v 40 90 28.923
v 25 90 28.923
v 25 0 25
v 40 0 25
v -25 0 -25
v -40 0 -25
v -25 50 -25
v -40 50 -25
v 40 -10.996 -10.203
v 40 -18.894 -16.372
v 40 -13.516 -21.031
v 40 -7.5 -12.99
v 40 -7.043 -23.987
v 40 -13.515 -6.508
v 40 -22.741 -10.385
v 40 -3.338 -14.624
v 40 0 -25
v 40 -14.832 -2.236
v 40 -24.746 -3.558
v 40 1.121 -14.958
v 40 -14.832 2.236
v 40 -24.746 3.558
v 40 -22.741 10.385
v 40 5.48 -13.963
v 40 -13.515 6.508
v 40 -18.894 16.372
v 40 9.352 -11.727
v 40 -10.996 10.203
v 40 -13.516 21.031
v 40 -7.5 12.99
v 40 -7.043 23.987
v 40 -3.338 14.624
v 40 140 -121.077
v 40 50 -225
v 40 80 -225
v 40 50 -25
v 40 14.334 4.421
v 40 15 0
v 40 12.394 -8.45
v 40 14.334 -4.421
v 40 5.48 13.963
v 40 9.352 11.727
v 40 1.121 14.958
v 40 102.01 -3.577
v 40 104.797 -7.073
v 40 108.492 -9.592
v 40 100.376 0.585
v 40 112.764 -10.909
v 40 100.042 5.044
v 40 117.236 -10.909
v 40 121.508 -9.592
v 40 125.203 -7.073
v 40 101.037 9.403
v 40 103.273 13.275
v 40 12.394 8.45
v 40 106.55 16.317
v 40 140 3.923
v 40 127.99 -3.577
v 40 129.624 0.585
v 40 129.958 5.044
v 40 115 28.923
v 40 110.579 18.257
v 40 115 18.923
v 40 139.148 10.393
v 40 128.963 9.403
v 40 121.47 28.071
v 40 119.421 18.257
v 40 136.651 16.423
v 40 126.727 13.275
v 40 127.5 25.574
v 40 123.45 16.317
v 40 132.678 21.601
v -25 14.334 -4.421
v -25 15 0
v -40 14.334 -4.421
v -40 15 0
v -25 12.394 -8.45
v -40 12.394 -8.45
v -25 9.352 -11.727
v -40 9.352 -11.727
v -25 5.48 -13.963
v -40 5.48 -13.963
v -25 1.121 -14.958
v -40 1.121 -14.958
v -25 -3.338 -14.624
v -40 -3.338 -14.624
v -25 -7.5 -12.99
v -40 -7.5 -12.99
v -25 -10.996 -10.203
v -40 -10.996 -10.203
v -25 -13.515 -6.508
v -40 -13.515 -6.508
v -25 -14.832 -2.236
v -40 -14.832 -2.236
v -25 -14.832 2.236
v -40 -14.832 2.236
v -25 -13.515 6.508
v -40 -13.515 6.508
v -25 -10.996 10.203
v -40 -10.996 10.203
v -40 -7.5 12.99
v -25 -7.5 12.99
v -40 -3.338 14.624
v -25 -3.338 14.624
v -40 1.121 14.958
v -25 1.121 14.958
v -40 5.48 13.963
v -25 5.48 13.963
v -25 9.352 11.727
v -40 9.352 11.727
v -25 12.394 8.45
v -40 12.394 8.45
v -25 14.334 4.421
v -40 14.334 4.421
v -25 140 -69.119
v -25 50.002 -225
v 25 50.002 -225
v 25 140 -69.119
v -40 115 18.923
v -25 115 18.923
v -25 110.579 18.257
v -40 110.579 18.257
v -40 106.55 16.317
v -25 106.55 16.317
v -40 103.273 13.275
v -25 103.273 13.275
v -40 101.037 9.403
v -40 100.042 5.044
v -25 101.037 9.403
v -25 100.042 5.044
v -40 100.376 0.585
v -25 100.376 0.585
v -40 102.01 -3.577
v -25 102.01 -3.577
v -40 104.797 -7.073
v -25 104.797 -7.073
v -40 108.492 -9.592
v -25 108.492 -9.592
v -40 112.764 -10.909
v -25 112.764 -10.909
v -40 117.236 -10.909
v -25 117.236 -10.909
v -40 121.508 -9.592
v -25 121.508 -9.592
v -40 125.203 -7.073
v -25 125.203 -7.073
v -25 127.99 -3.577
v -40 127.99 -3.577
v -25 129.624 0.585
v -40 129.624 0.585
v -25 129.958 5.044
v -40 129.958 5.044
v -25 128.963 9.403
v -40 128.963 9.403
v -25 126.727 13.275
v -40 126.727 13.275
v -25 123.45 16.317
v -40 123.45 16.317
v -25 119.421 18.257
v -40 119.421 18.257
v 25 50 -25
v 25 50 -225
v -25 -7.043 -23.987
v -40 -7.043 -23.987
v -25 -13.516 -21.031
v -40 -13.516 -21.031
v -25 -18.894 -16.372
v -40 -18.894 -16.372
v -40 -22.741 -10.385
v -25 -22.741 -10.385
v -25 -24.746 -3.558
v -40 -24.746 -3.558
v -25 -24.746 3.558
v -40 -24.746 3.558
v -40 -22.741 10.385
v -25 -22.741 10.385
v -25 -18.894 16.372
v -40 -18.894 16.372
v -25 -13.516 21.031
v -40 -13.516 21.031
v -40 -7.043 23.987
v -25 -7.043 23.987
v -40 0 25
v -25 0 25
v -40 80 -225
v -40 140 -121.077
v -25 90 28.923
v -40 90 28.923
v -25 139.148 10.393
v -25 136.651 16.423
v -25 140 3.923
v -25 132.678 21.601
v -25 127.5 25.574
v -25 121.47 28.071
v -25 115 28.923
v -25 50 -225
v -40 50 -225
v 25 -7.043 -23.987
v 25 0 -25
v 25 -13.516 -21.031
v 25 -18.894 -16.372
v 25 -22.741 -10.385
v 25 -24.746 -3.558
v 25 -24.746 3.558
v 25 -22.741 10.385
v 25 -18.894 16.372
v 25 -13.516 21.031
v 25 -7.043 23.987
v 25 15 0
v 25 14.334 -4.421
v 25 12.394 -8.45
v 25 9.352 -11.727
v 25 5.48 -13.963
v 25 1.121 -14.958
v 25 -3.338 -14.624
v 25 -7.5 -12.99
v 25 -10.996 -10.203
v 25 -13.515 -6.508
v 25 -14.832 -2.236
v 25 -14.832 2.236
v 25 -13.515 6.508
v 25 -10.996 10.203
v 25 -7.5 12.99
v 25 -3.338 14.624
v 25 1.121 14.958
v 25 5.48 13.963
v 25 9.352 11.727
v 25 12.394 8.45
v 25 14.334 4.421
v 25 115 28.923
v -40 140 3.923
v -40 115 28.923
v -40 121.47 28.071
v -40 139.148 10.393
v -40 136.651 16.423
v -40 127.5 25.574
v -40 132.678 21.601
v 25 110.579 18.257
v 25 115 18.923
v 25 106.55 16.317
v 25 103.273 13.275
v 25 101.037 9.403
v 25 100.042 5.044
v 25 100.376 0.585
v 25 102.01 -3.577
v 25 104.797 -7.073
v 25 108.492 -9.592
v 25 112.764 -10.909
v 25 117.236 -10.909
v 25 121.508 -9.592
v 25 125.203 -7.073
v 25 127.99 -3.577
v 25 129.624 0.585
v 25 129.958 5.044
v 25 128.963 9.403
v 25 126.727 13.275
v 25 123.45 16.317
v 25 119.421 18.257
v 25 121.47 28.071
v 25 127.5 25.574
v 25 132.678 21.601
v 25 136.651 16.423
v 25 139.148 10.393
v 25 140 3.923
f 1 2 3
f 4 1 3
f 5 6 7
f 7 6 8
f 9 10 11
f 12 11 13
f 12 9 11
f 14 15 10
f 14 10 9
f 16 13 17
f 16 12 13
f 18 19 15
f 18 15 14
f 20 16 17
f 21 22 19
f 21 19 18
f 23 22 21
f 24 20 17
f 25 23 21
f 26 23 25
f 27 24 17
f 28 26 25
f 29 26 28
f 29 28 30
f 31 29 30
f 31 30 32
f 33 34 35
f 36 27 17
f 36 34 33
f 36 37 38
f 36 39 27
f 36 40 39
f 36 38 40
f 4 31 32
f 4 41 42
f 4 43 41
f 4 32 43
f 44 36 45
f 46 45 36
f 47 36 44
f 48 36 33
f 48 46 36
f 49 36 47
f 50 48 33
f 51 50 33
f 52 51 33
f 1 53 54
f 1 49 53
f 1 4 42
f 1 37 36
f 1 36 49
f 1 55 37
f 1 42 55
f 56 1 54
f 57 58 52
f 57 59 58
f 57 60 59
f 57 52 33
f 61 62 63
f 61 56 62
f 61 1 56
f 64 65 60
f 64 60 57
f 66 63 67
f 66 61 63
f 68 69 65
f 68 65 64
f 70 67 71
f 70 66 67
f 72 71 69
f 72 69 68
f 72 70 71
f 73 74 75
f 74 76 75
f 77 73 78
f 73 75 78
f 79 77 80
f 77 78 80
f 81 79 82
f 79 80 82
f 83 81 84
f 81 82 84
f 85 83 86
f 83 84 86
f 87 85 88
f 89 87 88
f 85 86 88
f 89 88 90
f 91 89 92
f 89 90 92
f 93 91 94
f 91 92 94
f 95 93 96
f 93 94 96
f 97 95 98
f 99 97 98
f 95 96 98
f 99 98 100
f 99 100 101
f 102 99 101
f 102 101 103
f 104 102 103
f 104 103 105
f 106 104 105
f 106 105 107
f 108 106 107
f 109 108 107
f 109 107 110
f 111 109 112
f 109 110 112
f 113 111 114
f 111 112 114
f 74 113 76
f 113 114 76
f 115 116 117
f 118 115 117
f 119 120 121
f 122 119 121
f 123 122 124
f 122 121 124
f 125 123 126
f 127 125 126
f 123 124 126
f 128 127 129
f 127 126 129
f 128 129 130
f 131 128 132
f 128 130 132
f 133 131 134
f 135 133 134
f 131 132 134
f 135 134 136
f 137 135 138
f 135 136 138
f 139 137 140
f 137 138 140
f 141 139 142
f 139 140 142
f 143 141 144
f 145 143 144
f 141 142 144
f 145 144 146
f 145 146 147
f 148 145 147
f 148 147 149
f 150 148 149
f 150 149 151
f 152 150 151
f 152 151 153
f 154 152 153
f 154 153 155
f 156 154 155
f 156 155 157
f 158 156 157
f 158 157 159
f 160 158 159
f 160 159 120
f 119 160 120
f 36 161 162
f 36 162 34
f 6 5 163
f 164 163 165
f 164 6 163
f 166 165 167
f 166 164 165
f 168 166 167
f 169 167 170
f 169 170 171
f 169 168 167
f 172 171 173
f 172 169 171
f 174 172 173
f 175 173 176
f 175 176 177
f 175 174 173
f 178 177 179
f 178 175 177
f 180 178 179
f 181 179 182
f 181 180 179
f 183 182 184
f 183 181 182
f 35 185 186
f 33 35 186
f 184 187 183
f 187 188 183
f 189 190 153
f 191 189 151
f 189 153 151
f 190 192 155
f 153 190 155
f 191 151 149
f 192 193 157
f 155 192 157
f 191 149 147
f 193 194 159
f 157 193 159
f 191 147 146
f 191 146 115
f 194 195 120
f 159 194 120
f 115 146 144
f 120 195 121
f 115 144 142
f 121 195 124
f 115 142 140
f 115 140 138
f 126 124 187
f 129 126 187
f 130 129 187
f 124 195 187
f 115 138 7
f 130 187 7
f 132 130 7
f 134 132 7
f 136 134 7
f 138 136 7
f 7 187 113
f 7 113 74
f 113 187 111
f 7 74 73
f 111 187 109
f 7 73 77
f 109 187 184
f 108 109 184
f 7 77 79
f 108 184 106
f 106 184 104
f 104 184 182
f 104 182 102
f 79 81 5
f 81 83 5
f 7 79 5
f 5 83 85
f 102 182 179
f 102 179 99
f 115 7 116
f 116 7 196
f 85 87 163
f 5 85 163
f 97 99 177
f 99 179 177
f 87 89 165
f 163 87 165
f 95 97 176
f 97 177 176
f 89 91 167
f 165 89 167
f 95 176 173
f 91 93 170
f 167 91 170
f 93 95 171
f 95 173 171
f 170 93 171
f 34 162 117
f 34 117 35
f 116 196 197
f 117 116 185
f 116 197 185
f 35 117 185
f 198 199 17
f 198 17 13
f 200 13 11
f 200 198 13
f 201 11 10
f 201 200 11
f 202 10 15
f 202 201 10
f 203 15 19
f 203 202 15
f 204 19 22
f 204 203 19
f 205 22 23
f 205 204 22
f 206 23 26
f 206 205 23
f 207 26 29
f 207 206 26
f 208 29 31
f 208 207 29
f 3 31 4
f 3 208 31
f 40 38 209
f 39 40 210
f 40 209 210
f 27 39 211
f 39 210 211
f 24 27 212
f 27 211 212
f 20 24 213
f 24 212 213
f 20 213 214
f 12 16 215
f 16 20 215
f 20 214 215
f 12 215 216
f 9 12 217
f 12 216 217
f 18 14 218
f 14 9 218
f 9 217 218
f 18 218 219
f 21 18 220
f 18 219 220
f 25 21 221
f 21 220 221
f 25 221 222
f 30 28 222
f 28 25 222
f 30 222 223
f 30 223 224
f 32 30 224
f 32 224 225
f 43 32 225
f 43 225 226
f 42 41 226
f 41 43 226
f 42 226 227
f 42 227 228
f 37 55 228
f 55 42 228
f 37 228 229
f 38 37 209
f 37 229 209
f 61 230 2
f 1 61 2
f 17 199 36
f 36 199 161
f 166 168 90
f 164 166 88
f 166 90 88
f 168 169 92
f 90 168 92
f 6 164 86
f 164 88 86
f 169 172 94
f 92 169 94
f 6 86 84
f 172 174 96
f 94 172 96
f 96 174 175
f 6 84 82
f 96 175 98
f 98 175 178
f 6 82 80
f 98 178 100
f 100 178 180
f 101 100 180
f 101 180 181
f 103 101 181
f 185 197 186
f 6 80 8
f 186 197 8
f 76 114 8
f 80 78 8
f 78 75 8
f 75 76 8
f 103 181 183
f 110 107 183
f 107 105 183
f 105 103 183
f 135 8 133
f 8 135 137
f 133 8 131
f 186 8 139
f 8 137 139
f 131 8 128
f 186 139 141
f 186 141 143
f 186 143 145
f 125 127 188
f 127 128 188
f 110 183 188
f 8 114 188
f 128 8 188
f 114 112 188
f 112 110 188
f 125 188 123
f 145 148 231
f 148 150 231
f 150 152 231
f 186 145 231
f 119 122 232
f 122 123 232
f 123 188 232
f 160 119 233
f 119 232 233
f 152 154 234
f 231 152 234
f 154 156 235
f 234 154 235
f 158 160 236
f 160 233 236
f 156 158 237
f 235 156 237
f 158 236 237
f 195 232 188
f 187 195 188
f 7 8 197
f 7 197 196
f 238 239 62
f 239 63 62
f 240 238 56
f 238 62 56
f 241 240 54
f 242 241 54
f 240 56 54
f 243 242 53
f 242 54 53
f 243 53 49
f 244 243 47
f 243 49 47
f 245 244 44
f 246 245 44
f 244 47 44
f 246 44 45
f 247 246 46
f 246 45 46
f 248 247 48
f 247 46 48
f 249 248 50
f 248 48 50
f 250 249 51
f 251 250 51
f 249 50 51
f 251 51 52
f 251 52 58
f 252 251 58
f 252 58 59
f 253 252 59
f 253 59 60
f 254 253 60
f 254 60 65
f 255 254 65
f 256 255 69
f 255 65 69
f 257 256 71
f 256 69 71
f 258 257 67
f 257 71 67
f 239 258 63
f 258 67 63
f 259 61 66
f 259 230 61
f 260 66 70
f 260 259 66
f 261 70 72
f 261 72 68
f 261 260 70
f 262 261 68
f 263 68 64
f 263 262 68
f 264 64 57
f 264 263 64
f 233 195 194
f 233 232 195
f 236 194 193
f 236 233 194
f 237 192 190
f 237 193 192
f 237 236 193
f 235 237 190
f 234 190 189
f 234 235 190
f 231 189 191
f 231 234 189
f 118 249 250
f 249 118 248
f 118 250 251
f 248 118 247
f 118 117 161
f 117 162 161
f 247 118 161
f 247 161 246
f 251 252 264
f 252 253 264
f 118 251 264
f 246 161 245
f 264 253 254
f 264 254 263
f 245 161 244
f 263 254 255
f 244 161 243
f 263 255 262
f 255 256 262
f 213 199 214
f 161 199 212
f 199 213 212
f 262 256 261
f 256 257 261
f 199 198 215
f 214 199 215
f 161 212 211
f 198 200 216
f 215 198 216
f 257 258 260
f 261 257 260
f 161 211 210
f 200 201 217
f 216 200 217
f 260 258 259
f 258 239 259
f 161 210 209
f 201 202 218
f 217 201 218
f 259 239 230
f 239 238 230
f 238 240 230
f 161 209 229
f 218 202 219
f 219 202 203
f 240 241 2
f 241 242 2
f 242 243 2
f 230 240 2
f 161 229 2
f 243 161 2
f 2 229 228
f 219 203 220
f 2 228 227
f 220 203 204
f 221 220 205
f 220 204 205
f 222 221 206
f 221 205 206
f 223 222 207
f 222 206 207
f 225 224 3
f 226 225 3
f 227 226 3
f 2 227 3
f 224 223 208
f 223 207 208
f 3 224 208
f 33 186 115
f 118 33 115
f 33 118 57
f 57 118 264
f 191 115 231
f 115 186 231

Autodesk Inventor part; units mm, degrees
ref_plane "YZ Plane" through (0, 0, 0) normal (1, 0, 0) x (0, 1, 0)
ref_plane "XZ Plane" through (0, 0, 0) normal (0, 1, 0) x (-1, 0, 0)
sketch "草图1" plane through (0, 0, 0) normal (1, 0, 0) x (0, 1, 0)
  circle A0 centre (0, 0) radius 15
  arc A1 (0, 25) -> (0, -25) centre (0, 0) ccw
  line L0 (0, -25) -> (50, -25)
  line L1 (50, -25) -> (50, -225)
  line L2 (50, -225) -> (80, -225)
  line L3 (80, -225) -> (140, -121.077)
  line L4 (140, -121.077) -> (140, 28.923)
  line L5 (140, 28.923) -> (90, 28.923)
  line L6 (90, 28.923) -> (0, 25)
  dimension "d0" = 30
  dimension "d1" = 50
  dimension "d2" = 50
  dimension "d4" = 200
  dimension "d5" = 30
  dimension "d6" = 30
  dimension "d7" = 120
  dimension "d8" = 150
  dimension "d9" = 50
extrude "拉伸1" add sketch "草图1" along normal mid plane 80
sketch "草图2" plane through (-40, 50, -225) normal (0, -1, 0) x (1, 0, 0)
  line L0 (80, 0) -> (0, 0) projected
  line L1 (40, 0) -> (40, 253.923)
  line L2 (80, 253.923) -> (0, 253.923) projected
  line L3 (15, -693.1323) -> (65, -693.1323)
  line L4 (65, -693.1323) -> (65, 466.9493)
  line L5 (65, 466.9493) -> (15, 466.9493)
  line L6 (15, 466.9493) -> (15, -693.1323)
  line L7 (15, -693.1323) -> (65, 466.9493) construction
  line L8 (65, -693.1323) -> (15, 466.9493) construction
  point P0 (40, 225)
  point P1 (40, -113.0915)
  dimension "d12" = 50
extrude "拉伸2" cut sketch "草图2" along normal through all
ref_plane "工作平面2" through (0, 50, 27.1795) normal (0, 0.8660254, -0.5) x (1, 0, 0)
sketch "草图3" plane through (0, 50, 27.1795) normal (0, 0.8660254, -0.5) x (1, 0, 0)
  line L0 (25, -307.1385) -> (-25, -307.1385)
  line L1 (-25, -307.1385) -> (-25, 307.1385)
  line L2 (-25, 307.1385) -> (25, 307.1385)
  line L3 (25, 307.1385) -> (25, -307.1385)
  line L4 (-25, 0) -> (25, 0) projected
  line L5 (25, -307.1385) -> (-25, 307.1385) construction
  line L6 (-25, -307.1385) -> (25, 307.1385) construction
  point P0 (0, 48.5381)
  point P1 (0, 0)
  dimension "d16" = 50
extrude "拉伸3" cut sketch "草图3" along normal up to surface (126.0897 mm away)
fillet "圆角1" radius 25 2 edges at (-32.5, 140, 28.923) (32.5, 140, 28.923)
sketch "草图4" plane through (-40, 0, 0) normal (-1, 0, 0) x (0, 0, 1)
  line L0 (3.923, 140) -> (-121.077, 140) projected
  line L1 (28.923, 90) -> (28.923, 115) projected
  point P0 (0, 0)
  point P1 (3.923, 115)
  dimension "d27" = 25
  dimension "d28" = 25
hole "孔1" at (-40, 115, 3.923) direction (1, 0, 0) diameter 30 end through all
sketch "草图5" plane through (25, 0, -25) normal (-1, 0, 0) x (0, 0, 1)
  point P0 (25, 0)
properties part number "Finger" material "钢，高强度，低合金"
